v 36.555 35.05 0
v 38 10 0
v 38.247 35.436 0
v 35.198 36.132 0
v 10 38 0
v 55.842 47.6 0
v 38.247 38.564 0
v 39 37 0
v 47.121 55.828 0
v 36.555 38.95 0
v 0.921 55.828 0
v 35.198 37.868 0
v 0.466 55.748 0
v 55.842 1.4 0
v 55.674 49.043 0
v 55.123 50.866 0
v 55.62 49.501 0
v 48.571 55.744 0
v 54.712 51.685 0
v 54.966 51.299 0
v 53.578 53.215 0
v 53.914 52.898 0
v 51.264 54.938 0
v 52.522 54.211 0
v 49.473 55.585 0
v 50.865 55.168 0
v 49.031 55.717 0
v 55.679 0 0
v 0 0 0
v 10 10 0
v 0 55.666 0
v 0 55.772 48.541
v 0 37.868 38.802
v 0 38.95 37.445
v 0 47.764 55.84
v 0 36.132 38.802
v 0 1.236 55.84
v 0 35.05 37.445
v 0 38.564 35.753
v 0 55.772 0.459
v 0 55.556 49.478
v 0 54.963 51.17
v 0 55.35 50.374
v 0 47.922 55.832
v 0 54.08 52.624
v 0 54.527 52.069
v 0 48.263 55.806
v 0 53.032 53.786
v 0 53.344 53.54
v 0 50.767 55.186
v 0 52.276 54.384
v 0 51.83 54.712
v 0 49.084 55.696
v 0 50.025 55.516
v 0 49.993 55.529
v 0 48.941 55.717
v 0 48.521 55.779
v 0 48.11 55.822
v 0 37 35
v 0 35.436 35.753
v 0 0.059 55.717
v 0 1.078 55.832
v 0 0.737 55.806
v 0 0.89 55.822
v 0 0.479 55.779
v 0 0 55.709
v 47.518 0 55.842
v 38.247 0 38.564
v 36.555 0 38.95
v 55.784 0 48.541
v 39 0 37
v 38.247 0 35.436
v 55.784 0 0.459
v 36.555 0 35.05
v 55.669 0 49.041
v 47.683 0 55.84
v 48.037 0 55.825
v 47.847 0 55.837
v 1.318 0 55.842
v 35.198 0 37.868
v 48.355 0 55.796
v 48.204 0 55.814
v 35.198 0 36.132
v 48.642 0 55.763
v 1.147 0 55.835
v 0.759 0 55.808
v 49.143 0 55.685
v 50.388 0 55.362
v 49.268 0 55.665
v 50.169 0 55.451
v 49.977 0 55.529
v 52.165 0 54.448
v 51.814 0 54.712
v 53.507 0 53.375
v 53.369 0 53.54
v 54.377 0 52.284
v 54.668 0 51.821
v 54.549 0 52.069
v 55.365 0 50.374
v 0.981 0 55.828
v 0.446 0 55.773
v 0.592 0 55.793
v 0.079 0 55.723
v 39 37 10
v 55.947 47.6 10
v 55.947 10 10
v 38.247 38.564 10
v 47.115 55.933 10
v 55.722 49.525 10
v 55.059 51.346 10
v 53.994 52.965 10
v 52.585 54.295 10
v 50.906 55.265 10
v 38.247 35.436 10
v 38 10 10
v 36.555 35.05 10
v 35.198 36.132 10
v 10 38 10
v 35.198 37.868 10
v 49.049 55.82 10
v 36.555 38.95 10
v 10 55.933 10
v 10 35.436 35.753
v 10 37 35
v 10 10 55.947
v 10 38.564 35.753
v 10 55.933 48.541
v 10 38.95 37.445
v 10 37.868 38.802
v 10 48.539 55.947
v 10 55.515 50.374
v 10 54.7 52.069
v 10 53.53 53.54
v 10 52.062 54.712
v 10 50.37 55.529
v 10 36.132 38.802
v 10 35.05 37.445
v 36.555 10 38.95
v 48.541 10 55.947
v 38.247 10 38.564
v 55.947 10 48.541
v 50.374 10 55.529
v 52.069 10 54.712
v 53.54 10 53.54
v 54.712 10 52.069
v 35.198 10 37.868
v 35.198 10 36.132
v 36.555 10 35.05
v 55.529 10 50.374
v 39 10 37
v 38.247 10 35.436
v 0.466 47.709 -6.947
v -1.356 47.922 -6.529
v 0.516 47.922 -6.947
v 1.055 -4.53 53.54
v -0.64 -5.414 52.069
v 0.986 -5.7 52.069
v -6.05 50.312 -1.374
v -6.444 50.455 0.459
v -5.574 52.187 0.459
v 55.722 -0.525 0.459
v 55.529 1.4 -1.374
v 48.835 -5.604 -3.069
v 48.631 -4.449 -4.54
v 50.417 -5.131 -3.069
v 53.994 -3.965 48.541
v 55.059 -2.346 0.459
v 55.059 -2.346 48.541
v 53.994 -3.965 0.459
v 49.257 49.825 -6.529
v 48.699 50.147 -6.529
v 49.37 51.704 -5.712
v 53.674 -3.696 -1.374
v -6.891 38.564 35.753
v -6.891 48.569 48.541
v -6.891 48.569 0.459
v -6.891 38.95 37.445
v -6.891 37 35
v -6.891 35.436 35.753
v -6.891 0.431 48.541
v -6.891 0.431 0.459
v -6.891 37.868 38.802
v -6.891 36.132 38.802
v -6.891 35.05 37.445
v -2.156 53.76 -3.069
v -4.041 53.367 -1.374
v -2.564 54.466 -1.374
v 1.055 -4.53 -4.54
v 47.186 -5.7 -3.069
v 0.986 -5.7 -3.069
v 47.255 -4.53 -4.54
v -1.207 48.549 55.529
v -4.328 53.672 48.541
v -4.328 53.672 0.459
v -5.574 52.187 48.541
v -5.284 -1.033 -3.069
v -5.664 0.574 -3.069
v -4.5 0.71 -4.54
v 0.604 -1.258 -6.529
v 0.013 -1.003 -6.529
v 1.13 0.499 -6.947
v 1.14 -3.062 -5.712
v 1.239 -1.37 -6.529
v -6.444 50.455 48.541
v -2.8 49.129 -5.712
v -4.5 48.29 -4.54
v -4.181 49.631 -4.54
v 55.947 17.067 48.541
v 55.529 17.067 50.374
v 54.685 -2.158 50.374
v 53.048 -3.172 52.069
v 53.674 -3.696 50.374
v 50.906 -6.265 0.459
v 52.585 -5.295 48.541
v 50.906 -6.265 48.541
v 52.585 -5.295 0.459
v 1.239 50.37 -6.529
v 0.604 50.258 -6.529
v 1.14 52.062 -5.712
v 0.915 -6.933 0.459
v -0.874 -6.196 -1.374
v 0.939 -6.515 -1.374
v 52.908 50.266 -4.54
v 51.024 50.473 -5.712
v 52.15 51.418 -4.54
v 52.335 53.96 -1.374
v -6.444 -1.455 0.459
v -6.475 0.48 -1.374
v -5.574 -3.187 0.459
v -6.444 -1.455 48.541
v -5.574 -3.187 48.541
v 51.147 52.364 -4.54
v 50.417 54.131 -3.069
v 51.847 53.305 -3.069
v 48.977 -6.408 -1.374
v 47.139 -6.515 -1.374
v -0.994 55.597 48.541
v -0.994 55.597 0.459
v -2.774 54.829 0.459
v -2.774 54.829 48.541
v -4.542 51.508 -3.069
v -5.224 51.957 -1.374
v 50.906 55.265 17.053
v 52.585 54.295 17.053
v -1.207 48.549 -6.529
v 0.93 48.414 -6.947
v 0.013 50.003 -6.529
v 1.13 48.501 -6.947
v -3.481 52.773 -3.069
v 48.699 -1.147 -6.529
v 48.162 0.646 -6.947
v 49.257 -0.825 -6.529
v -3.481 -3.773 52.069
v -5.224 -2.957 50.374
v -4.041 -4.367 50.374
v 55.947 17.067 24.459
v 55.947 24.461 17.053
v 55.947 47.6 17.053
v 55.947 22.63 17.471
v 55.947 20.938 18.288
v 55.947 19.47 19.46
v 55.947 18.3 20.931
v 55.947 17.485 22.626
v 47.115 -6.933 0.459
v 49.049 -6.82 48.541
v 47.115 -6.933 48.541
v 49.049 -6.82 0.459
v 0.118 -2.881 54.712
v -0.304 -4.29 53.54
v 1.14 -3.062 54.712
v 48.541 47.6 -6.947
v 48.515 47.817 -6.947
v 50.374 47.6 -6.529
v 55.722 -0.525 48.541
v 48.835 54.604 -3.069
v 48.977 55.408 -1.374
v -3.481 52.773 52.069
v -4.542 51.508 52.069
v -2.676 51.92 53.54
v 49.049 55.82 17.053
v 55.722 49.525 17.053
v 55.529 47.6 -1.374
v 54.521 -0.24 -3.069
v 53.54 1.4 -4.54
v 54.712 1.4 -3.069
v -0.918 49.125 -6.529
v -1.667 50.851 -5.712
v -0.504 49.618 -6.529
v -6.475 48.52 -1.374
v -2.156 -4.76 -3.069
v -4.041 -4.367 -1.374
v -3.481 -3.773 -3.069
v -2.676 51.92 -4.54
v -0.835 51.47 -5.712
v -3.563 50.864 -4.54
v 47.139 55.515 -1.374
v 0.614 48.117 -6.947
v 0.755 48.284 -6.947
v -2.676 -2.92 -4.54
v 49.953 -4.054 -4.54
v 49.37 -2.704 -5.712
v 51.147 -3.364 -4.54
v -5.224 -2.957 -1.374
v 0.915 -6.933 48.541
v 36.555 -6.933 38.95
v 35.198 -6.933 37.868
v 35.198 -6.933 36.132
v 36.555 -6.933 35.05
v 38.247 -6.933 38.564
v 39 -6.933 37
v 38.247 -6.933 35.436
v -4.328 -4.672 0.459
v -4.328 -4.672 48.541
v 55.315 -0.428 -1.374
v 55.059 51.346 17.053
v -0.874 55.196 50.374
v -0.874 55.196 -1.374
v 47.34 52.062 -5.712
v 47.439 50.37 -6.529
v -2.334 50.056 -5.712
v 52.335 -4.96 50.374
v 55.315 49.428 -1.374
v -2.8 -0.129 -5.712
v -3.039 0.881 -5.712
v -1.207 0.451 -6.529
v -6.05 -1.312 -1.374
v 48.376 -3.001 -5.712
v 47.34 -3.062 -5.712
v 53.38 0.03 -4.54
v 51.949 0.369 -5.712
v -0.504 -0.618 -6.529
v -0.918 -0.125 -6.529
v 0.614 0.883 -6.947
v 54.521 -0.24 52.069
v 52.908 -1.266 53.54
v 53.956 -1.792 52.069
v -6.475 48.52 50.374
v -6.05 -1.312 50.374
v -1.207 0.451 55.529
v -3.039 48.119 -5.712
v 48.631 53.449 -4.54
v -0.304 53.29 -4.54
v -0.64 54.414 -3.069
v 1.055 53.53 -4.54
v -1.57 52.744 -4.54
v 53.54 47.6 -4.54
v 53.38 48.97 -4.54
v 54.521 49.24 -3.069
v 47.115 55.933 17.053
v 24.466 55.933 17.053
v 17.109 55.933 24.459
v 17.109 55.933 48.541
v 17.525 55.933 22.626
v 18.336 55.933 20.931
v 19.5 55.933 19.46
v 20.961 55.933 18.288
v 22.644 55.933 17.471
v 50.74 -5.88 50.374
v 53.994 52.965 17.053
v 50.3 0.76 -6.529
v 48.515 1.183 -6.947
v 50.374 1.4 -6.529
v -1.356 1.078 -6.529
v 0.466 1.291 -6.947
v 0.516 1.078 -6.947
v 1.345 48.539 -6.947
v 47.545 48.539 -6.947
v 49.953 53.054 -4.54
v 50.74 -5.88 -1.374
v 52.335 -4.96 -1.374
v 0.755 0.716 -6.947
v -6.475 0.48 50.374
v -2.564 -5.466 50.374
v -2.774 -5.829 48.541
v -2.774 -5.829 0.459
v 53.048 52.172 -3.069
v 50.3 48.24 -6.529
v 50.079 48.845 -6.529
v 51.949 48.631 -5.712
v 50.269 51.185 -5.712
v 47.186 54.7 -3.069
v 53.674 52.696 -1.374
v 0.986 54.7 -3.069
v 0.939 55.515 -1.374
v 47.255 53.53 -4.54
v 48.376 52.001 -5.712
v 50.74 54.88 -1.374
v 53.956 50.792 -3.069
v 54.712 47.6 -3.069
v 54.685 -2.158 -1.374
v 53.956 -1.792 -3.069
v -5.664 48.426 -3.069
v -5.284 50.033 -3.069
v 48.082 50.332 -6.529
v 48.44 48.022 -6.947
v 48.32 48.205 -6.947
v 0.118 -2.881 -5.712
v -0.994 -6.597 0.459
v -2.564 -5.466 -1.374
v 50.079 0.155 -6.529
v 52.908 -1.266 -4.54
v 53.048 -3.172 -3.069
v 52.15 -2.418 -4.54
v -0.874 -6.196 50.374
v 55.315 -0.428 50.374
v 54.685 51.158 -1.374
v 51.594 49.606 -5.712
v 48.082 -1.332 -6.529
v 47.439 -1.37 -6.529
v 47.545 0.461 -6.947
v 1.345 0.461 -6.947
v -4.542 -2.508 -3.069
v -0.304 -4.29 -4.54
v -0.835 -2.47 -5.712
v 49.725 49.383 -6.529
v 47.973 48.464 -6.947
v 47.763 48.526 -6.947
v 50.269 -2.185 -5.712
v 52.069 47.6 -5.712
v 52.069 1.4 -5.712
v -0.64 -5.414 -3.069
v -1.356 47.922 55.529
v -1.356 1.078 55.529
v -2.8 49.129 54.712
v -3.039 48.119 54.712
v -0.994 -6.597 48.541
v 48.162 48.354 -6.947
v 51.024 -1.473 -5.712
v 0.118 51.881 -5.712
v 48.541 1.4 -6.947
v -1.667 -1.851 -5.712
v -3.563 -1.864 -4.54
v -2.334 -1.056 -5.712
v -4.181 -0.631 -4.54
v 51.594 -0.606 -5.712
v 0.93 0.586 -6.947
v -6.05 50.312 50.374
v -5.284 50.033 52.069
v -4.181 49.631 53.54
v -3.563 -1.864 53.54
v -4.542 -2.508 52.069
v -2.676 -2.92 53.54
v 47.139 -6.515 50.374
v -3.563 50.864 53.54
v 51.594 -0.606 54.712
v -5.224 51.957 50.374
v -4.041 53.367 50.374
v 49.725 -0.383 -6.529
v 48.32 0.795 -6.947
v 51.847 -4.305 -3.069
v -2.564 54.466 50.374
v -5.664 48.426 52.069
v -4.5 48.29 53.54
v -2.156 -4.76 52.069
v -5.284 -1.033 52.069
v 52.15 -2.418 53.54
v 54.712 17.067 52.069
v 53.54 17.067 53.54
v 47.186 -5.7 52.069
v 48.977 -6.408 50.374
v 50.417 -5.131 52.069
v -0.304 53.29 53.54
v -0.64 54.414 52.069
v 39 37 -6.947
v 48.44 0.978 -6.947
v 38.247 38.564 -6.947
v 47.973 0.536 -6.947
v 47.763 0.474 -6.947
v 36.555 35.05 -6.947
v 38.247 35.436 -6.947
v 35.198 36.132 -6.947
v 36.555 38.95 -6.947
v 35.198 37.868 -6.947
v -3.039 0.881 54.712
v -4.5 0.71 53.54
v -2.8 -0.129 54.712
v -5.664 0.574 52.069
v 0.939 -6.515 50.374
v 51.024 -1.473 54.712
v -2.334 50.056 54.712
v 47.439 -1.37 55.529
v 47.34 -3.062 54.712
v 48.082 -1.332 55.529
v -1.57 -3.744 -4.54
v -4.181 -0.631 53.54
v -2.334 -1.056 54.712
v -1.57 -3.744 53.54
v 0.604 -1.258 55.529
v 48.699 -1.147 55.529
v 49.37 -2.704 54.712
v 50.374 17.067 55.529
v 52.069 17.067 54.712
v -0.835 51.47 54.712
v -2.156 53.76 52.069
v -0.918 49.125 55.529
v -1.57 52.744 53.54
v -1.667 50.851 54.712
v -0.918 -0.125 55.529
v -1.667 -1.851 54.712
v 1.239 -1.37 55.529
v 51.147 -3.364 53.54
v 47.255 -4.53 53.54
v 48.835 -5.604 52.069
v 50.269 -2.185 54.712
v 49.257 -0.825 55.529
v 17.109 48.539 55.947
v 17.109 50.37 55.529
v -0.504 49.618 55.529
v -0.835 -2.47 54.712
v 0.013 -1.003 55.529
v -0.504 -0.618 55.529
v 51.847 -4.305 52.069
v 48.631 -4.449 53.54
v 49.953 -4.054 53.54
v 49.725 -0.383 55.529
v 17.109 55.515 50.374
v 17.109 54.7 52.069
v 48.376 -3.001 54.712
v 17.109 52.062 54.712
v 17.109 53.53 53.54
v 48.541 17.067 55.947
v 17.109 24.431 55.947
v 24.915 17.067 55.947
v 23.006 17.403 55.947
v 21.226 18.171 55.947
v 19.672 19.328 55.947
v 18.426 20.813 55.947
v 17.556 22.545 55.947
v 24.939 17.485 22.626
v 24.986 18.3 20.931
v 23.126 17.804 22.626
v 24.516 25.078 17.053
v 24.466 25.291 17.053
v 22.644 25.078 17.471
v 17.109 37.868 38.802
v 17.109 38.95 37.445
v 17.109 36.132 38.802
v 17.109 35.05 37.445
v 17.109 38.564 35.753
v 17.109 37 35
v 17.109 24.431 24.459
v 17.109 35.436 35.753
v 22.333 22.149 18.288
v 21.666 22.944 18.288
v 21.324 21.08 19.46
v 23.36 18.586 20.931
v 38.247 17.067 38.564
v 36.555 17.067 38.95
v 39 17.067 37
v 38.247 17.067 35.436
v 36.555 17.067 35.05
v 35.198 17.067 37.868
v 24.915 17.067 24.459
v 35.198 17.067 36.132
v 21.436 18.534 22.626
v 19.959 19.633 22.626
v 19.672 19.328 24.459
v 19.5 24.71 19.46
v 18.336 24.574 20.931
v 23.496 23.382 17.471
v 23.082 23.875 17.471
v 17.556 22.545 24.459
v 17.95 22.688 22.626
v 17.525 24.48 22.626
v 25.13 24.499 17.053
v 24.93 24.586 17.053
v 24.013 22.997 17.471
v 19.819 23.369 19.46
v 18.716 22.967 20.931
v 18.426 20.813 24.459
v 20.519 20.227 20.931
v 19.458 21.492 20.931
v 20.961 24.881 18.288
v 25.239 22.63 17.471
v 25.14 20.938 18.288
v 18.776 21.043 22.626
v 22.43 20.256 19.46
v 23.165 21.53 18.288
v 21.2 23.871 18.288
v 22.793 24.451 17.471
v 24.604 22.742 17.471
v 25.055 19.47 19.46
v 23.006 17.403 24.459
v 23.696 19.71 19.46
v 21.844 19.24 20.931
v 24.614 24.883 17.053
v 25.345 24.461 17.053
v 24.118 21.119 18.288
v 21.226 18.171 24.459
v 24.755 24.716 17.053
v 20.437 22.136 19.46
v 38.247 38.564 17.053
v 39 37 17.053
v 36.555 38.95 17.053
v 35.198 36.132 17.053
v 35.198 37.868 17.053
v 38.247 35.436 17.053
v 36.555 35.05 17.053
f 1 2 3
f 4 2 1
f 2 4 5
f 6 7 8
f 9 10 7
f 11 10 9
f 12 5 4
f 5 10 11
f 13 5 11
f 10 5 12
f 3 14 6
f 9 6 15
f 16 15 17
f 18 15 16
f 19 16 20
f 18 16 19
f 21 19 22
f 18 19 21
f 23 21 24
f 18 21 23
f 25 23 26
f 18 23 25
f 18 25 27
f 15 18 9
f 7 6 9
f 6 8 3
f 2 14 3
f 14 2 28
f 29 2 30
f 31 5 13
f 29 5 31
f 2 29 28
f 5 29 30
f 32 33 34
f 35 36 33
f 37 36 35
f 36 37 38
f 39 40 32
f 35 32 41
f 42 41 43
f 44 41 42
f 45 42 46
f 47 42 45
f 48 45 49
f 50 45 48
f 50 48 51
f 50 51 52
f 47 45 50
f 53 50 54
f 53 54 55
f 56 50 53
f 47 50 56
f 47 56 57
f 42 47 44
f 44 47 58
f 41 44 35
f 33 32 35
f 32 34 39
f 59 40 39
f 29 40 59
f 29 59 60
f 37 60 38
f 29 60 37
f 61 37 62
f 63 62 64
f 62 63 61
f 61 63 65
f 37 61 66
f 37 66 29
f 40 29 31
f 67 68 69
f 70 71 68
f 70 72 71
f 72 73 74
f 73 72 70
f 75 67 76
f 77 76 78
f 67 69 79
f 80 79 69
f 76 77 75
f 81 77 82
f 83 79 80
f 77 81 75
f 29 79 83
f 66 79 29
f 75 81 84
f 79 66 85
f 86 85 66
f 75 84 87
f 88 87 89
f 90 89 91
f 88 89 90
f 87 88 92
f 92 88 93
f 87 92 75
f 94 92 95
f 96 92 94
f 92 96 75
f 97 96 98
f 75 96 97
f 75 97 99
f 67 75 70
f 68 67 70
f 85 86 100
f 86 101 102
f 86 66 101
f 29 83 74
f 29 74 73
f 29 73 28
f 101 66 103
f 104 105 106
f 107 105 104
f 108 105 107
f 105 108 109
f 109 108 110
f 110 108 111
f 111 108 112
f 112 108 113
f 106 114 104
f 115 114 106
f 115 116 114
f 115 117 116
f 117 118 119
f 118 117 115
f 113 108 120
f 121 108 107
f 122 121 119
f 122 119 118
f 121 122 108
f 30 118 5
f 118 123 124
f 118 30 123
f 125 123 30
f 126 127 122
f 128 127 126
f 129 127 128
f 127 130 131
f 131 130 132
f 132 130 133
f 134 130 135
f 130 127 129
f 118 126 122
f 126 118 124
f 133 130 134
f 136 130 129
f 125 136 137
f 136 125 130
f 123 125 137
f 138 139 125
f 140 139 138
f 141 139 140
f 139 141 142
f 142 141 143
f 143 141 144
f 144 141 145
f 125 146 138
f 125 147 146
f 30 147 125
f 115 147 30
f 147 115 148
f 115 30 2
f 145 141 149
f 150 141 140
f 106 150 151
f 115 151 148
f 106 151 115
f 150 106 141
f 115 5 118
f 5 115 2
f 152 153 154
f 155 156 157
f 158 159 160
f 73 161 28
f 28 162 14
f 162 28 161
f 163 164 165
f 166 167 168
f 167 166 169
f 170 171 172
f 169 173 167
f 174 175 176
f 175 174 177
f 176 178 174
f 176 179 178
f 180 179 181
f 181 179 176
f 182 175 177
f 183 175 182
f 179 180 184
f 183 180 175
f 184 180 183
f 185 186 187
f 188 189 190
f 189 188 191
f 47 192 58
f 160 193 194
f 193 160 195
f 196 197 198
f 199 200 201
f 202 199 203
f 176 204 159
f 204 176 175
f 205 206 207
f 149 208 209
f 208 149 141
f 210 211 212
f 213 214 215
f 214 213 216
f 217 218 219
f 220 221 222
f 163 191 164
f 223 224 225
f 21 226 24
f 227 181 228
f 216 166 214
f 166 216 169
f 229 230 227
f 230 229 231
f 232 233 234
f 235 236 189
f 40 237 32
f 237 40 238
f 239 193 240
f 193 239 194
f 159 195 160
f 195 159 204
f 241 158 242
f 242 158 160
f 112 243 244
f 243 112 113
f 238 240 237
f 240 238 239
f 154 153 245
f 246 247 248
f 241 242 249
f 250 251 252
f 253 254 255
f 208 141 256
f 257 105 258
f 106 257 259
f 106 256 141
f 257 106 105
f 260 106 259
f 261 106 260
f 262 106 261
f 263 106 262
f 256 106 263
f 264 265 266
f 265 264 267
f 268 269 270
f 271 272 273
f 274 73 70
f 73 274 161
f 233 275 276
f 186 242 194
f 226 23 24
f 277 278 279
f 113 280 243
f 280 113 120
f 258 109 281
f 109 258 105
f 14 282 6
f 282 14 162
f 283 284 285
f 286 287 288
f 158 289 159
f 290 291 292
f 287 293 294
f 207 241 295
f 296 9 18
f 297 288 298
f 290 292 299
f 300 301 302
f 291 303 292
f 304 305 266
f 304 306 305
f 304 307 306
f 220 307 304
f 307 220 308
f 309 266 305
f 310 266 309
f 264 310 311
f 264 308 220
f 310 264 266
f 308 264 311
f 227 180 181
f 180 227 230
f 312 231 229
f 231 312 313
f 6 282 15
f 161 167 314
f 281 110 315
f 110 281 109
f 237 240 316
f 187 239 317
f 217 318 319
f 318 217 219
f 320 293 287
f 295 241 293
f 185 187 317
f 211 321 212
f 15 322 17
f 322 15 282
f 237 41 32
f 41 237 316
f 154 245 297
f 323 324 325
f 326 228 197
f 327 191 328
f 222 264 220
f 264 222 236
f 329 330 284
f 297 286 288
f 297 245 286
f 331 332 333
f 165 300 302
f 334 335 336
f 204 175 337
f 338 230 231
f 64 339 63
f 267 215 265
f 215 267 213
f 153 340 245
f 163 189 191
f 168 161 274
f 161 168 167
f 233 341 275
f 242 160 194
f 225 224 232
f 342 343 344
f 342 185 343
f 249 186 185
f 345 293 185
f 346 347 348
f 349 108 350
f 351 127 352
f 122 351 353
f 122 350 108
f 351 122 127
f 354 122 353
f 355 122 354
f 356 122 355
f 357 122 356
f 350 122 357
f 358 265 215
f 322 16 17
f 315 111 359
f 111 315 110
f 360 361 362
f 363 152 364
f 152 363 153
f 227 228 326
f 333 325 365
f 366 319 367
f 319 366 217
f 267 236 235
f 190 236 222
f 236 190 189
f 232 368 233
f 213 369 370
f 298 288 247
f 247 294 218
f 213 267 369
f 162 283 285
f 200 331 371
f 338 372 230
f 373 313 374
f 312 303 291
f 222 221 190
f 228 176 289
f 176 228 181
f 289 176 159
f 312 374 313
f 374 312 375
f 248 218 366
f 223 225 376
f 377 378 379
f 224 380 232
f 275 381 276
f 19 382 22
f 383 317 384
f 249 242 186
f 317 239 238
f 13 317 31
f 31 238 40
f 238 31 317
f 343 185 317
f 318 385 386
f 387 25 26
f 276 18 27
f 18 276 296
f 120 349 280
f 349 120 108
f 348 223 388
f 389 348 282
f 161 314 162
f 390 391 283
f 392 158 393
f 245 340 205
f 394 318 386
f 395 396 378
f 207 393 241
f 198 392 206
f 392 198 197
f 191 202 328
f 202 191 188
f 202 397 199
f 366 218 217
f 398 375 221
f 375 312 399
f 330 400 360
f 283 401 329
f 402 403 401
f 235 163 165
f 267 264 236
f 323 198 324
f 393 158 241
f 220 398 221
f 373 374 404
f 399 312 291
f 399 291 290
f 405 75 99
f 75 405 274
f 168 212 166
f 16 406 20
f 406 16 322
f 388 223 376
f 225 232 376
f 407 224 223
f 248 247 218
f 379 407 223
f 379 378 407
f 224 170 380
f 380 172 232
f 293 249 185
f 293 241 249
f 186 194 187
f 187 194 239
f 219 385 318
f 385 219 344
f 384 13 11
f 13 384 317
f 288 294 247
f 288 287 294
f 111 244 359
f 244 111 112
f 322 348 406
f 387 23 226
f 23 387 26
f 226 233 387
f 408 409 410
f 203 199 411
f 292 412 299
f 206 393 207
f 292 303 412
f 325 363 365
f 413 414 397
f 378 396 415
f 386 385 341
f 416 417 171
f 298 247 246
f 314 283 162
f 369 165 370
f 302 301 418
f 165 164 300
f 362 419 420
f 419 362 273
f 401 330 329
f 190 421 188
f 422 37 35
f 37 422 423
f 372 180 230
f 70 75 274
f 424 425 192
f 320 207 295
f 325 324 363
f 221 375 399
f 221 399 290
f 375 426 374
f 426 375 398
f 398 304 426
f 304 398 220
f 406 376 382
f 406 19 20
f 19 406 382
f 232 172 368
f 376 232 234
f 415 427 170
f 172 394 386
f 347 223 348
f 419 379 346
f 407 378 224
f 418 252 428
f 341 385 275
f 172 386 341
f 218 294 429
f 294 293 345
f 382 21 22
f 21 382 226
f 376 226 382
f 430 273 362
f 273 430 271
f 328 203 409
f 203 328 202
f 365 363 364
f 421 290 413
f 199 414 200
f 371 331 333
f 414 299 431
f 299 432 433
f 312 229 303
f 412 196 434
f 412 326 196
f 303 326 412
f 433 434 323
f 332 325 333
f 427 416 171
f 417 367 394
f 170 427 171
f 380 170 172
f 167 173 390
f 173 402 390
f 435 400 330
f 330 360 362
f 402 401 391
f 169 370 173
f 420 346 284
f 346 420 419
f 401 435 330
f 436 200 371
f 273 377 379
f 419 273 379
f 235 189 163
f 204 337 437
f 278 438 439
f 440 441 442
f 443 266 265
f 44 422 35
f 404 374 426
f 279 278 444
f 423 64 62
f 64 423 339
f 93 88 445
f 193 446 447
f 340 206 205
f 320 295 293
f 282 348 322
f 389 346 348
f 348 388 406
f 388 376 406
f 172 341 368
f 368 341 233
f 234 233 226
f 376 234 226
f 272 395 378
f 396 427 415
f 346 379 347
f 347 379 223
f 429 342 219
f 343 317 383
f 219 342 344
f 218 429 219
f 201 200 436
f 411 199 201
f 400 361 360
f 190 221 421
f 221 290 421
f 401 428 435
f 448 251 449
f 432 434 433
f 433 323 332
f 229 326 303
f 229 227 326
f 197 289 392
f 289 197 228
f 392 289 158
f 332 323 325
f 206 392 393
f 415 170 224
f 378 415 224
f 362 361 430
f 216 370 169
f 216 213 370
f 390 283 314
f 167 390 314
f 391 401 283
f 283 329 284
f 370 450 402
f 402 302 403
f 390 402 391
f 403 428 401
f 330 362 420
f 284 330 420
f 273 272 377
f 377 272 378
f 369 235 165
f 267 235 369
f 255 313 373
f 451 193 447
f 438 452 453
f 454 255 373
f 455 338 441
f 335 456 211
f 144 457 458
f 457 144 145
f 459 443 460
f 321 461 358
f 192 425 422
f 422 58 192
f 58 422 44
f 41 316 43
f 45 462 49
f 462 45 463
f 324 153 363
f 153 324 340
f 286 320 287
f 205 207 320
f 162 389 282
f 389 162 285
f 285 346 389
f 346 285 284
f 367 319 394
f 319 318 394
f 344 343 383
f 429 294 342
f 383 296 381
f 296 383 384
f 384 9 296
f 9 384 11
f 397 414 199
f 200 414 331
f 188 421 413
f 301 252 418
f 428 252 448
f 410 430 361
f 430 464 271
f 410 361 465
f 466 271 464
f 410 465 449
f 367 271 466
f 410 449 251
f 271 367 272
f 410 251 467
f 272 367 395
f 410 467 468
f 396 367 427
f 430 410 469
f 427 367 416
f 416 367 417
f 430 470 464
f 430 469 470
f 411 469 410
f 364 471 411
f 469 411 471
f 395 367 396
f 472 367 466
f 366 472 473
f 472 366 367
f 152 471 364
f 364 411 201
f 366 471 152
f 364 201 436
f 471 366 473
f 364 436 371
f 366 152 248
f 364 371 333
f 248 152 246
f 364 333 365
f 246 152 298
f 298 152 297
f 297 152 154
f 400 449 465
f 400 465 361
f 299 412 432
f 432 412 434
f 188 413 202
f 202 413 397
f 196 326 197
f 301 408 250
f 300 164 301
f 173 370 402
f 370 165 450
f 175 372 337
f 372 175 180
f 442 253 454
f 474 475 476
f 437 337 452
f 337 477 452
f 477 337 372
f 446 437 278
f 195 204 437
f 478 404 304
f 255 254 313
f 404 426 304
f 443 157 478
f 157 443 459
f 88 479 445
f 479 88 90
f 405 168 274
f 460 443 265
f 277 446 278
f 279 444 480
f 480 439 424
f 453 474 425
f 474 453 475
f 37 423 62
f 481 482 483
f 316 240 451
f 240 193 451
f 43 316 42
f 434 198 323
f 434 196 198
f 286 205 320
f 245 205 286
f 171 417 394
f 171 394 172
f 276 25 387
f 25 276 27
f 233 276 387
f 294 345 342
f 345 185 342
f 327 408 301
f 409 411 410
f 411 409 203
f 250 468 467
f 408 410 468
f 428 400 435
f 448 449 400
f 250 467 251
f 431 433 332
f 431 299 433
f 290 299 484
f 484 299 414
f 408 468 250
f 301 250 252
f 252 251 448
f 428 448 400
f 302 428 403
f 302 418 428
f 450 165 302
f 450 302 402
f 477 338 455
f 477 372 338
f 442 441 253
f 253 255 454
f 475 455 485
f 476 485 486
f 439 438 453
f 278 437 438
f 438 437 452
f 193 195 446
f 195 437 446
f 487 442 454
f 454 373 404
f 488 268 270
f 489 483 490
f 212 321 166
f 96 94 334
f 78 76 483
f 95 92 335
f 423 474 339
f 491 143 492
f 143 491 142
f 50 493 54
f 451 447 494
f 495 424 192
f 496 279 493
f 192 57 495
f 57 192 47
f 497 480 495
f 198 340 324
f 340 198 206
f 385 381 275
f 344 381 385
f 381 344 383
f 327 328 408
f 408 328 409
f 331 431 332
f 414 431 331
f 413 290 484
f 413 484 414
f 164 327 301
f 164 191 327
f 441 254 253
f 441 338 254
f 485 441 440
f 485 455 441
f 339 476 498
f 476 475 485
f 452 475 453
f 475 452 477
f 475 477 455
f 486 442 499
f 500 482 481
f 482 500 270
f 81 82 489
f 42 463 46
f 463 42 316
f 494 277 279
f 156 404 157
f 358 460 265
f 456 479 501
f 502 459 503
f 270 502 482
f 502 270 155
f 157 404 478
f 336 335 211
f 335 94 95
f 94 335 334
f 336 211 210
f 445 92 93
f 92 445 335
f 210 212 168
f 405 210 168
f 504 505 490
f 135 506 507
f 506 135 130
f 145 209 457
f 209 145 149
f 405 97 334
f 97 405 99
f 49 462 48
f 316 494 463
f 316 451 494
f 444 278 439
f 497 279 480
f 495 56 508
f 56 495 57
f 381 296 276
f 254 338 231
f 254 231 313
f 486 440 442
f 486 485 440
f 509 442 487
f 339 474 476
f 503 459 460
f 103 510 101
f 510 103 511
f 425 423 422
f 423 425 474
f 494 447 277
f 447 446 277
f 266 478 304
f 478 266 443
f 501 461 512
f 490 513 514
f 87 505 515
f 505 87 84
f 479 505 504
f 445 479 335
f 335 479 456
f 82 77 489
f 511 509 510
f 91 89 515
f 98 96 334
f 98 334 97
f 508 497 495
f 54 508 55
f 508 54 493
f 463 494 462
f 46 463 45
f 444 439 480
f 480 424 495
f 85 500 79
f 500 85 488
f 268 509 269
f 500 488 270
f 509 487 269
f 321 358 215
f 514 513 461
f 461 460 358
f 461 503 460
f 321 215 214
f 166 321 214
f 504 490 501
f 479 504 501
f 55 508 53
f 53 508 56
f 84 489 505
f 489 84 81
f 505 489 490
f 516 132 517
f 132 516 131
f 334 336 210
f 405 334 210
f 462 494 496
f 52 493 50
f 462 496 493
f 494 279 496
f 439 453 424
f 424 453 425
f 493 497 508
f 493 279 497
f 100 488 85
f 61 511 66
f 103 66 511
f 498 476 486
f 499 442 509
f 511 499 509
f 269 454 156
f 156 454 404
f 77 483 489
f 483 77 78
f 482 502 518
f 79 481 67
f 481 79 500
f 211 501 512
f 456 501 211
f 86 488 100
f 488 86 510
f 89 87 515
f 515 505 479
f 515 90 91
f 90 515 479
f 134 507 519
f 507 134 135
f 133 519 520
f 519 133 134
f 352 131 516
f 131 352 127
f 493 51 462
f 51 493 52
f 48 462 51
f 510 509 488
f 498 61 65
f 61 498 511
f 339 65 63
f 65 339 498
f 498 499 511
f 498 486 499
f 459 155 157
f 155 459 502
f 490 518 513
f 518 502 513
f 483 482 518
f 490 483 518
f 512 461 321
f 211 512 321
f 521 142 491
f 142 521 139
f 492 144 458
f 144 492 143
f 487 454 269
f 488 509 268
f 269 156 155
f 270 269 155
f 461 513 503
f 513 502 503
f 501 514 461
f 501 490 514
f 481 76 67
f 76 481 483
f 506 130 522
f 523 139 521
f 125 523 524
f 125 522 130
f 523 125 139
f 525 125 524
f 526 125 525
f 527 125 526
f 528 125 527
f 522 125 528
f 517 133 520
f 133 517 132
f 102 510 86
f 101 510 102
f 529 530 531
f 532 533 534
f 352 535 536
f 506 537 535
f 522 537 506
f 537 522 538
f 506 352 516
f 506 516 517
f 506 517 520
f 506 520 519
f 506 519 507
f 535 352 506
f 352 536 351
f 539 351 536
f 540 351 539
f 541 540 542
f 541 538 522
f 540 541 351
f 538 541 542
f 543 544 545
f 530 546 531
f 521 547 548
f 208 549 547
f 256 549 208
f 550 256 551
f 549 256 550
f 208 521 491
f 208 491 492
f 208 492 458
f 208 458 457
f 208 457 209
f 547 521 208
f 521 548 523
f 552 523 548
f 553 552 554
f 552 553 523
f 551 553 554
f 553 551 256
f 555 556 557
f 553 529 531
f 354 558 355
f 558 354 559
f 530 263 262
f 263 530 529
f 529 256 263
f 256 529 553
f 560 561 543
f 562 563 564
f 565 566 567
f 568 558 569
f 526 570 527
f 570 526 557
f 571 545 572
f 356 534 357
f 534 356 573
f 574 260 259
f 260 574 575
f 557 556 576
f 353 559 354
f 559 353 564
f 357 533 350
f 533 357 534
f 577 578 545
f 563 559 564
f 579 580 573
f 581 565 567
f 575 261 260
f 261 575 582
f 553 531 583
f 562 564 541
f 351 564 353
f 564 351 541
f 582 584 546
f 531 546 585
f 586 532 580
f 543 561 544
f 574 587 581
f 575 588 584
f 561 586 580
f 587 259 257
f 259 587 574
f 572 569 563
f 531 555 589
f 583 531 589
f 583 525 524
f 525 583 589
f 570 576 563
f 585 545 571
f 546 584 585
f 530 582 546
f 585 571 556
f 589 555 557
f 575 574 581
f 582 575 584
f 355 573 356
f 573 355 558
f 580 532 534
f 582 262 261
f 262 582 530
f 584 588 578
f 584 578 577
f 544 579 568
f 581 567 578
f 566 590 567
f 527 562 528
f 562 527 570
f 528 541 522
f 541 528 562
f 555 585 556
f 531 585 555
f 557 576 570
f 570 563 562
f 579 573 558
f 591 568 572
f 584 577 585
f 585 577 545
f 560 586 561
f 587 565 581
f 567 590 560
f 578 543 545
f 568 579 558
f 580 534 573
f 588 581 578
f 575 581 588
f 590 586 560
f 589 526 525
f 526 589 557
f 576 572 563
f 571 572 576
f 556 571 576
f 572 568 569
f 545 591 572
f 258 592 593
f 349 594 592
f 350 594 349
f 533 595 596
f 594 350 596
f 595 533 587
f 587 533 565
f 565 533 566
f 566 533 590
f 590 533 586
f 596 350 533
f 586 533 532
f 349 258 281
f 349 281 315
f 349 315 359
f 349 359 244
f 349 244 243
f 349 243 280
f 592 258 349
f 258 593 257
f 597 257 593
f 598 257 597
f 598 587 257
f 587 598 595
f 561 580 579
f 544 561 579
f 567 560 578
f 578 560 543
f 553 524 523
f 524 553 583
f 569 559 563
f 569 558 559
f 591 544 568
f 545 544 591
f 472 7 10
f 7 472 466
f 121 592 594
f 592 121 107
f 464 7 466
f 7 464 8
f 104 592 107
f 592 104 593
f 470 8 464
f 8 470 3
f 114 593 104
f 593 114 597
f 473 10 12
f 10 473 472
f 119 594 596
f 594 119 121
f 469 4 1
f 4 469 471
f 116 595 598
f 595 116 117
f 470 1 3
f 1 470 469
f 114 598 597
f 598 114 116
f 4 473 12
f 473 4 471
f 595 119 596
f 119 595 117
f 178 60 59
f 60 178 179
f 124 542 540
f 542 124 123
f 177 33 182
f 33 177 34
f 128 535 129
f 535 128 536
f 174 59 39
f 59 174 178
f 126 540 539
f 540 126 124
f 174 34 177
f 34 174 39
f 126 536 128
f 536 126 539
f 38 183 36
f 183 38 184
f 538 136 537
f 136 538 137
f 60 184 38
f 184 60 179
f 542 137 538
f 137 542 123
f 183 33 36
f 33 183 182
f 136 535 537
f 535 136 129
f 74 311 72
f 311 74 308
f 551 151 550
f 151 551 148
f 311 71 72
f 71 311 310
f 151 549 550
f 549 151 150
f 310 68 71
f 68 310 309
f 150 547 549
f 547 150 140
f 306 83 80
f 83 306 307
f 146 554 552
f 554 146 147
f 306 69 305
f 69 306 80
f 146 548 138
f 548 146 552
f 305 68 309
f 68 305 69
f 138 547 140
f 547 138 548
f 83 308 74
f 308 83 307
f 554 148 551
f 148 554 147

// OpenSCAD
//
//  Copyright (C) 12-04-2013 Jasper den Ouden.(ojasper.nl)
//
//  This is free software: you can redistribute it and/or modify
//  it under the terms of the GNU General Public License as published
//  by the Free Software Foundation, either version 3 of the License, or
//  (at your option) any later version.
//

inf = 100;
t = 7;
tx= t;
ty= t;
tz= t;
r=  1.2*t;
wall_t = 10; //Wall thickness.
wall_tx= wall_t;
wall_ty= wall_t;
wall_tz= wall_t;

corner_dx = 4*t;
corner_dy = 4*t;
screw_r  = 20;
screw_ir = 2;

dx = tx + max(wall_tx + 2*screw_r, 2*corner_dx);
dy = ty + max(wall_ty + 2*screw_r, 2*corner_dy);
dz = tz + max(wall_tz + 2*screw_r, 2*corner_dy);

module walls()
{
    difference()
    {   cube(inf*[1,1,1]);
        translate([wall_t,wall_t,wall_t]) cube(inf*[1,1,1]);
        translate([wall_t,wall_t,-inf]) linear_extrude(height=3*inf)
            polygon([[0,0],[corner_dx,0],[0,corner_dy]]);
    }
}

module rounded_cube(dx,dy,dz)
{
    hull() for(x=[r,dx-r]) for(y=[r,dy-r]) for(z=[r,dz-r]) translate([x,y,z]) sphere(r);
}

module corner()
{   difference()
    {   translate([-tx,-ty,-tz]) rounded_cube(dx,dy,dz, r);
        walls();
        translate([wall_tx+tx,wall_ty+ty,wall_tz+tz]) rounded_cube(inf,inf,inf, r);
        //Holes for screws.
        translate([wall_tx+tx+screw_r,wall_ty+ty+screw_r,-inf]) cylinder(r=screw_ir, h=3*inf);
        translate([-inf,wall_ty+ty+screw_r,wall_tz+tz+screw_r]) rotate([0,90]) 
            cylinder(r=screw_ir, h=3*inf);

        translate([wall_tx+tx+screw_r,-inf,wall_tz+tz+screw_r]) rotate([-90,0]) 
            cylinder(r=screw_ir, h=3*inf);
    }
}

//TODO how to print it..
corner();
